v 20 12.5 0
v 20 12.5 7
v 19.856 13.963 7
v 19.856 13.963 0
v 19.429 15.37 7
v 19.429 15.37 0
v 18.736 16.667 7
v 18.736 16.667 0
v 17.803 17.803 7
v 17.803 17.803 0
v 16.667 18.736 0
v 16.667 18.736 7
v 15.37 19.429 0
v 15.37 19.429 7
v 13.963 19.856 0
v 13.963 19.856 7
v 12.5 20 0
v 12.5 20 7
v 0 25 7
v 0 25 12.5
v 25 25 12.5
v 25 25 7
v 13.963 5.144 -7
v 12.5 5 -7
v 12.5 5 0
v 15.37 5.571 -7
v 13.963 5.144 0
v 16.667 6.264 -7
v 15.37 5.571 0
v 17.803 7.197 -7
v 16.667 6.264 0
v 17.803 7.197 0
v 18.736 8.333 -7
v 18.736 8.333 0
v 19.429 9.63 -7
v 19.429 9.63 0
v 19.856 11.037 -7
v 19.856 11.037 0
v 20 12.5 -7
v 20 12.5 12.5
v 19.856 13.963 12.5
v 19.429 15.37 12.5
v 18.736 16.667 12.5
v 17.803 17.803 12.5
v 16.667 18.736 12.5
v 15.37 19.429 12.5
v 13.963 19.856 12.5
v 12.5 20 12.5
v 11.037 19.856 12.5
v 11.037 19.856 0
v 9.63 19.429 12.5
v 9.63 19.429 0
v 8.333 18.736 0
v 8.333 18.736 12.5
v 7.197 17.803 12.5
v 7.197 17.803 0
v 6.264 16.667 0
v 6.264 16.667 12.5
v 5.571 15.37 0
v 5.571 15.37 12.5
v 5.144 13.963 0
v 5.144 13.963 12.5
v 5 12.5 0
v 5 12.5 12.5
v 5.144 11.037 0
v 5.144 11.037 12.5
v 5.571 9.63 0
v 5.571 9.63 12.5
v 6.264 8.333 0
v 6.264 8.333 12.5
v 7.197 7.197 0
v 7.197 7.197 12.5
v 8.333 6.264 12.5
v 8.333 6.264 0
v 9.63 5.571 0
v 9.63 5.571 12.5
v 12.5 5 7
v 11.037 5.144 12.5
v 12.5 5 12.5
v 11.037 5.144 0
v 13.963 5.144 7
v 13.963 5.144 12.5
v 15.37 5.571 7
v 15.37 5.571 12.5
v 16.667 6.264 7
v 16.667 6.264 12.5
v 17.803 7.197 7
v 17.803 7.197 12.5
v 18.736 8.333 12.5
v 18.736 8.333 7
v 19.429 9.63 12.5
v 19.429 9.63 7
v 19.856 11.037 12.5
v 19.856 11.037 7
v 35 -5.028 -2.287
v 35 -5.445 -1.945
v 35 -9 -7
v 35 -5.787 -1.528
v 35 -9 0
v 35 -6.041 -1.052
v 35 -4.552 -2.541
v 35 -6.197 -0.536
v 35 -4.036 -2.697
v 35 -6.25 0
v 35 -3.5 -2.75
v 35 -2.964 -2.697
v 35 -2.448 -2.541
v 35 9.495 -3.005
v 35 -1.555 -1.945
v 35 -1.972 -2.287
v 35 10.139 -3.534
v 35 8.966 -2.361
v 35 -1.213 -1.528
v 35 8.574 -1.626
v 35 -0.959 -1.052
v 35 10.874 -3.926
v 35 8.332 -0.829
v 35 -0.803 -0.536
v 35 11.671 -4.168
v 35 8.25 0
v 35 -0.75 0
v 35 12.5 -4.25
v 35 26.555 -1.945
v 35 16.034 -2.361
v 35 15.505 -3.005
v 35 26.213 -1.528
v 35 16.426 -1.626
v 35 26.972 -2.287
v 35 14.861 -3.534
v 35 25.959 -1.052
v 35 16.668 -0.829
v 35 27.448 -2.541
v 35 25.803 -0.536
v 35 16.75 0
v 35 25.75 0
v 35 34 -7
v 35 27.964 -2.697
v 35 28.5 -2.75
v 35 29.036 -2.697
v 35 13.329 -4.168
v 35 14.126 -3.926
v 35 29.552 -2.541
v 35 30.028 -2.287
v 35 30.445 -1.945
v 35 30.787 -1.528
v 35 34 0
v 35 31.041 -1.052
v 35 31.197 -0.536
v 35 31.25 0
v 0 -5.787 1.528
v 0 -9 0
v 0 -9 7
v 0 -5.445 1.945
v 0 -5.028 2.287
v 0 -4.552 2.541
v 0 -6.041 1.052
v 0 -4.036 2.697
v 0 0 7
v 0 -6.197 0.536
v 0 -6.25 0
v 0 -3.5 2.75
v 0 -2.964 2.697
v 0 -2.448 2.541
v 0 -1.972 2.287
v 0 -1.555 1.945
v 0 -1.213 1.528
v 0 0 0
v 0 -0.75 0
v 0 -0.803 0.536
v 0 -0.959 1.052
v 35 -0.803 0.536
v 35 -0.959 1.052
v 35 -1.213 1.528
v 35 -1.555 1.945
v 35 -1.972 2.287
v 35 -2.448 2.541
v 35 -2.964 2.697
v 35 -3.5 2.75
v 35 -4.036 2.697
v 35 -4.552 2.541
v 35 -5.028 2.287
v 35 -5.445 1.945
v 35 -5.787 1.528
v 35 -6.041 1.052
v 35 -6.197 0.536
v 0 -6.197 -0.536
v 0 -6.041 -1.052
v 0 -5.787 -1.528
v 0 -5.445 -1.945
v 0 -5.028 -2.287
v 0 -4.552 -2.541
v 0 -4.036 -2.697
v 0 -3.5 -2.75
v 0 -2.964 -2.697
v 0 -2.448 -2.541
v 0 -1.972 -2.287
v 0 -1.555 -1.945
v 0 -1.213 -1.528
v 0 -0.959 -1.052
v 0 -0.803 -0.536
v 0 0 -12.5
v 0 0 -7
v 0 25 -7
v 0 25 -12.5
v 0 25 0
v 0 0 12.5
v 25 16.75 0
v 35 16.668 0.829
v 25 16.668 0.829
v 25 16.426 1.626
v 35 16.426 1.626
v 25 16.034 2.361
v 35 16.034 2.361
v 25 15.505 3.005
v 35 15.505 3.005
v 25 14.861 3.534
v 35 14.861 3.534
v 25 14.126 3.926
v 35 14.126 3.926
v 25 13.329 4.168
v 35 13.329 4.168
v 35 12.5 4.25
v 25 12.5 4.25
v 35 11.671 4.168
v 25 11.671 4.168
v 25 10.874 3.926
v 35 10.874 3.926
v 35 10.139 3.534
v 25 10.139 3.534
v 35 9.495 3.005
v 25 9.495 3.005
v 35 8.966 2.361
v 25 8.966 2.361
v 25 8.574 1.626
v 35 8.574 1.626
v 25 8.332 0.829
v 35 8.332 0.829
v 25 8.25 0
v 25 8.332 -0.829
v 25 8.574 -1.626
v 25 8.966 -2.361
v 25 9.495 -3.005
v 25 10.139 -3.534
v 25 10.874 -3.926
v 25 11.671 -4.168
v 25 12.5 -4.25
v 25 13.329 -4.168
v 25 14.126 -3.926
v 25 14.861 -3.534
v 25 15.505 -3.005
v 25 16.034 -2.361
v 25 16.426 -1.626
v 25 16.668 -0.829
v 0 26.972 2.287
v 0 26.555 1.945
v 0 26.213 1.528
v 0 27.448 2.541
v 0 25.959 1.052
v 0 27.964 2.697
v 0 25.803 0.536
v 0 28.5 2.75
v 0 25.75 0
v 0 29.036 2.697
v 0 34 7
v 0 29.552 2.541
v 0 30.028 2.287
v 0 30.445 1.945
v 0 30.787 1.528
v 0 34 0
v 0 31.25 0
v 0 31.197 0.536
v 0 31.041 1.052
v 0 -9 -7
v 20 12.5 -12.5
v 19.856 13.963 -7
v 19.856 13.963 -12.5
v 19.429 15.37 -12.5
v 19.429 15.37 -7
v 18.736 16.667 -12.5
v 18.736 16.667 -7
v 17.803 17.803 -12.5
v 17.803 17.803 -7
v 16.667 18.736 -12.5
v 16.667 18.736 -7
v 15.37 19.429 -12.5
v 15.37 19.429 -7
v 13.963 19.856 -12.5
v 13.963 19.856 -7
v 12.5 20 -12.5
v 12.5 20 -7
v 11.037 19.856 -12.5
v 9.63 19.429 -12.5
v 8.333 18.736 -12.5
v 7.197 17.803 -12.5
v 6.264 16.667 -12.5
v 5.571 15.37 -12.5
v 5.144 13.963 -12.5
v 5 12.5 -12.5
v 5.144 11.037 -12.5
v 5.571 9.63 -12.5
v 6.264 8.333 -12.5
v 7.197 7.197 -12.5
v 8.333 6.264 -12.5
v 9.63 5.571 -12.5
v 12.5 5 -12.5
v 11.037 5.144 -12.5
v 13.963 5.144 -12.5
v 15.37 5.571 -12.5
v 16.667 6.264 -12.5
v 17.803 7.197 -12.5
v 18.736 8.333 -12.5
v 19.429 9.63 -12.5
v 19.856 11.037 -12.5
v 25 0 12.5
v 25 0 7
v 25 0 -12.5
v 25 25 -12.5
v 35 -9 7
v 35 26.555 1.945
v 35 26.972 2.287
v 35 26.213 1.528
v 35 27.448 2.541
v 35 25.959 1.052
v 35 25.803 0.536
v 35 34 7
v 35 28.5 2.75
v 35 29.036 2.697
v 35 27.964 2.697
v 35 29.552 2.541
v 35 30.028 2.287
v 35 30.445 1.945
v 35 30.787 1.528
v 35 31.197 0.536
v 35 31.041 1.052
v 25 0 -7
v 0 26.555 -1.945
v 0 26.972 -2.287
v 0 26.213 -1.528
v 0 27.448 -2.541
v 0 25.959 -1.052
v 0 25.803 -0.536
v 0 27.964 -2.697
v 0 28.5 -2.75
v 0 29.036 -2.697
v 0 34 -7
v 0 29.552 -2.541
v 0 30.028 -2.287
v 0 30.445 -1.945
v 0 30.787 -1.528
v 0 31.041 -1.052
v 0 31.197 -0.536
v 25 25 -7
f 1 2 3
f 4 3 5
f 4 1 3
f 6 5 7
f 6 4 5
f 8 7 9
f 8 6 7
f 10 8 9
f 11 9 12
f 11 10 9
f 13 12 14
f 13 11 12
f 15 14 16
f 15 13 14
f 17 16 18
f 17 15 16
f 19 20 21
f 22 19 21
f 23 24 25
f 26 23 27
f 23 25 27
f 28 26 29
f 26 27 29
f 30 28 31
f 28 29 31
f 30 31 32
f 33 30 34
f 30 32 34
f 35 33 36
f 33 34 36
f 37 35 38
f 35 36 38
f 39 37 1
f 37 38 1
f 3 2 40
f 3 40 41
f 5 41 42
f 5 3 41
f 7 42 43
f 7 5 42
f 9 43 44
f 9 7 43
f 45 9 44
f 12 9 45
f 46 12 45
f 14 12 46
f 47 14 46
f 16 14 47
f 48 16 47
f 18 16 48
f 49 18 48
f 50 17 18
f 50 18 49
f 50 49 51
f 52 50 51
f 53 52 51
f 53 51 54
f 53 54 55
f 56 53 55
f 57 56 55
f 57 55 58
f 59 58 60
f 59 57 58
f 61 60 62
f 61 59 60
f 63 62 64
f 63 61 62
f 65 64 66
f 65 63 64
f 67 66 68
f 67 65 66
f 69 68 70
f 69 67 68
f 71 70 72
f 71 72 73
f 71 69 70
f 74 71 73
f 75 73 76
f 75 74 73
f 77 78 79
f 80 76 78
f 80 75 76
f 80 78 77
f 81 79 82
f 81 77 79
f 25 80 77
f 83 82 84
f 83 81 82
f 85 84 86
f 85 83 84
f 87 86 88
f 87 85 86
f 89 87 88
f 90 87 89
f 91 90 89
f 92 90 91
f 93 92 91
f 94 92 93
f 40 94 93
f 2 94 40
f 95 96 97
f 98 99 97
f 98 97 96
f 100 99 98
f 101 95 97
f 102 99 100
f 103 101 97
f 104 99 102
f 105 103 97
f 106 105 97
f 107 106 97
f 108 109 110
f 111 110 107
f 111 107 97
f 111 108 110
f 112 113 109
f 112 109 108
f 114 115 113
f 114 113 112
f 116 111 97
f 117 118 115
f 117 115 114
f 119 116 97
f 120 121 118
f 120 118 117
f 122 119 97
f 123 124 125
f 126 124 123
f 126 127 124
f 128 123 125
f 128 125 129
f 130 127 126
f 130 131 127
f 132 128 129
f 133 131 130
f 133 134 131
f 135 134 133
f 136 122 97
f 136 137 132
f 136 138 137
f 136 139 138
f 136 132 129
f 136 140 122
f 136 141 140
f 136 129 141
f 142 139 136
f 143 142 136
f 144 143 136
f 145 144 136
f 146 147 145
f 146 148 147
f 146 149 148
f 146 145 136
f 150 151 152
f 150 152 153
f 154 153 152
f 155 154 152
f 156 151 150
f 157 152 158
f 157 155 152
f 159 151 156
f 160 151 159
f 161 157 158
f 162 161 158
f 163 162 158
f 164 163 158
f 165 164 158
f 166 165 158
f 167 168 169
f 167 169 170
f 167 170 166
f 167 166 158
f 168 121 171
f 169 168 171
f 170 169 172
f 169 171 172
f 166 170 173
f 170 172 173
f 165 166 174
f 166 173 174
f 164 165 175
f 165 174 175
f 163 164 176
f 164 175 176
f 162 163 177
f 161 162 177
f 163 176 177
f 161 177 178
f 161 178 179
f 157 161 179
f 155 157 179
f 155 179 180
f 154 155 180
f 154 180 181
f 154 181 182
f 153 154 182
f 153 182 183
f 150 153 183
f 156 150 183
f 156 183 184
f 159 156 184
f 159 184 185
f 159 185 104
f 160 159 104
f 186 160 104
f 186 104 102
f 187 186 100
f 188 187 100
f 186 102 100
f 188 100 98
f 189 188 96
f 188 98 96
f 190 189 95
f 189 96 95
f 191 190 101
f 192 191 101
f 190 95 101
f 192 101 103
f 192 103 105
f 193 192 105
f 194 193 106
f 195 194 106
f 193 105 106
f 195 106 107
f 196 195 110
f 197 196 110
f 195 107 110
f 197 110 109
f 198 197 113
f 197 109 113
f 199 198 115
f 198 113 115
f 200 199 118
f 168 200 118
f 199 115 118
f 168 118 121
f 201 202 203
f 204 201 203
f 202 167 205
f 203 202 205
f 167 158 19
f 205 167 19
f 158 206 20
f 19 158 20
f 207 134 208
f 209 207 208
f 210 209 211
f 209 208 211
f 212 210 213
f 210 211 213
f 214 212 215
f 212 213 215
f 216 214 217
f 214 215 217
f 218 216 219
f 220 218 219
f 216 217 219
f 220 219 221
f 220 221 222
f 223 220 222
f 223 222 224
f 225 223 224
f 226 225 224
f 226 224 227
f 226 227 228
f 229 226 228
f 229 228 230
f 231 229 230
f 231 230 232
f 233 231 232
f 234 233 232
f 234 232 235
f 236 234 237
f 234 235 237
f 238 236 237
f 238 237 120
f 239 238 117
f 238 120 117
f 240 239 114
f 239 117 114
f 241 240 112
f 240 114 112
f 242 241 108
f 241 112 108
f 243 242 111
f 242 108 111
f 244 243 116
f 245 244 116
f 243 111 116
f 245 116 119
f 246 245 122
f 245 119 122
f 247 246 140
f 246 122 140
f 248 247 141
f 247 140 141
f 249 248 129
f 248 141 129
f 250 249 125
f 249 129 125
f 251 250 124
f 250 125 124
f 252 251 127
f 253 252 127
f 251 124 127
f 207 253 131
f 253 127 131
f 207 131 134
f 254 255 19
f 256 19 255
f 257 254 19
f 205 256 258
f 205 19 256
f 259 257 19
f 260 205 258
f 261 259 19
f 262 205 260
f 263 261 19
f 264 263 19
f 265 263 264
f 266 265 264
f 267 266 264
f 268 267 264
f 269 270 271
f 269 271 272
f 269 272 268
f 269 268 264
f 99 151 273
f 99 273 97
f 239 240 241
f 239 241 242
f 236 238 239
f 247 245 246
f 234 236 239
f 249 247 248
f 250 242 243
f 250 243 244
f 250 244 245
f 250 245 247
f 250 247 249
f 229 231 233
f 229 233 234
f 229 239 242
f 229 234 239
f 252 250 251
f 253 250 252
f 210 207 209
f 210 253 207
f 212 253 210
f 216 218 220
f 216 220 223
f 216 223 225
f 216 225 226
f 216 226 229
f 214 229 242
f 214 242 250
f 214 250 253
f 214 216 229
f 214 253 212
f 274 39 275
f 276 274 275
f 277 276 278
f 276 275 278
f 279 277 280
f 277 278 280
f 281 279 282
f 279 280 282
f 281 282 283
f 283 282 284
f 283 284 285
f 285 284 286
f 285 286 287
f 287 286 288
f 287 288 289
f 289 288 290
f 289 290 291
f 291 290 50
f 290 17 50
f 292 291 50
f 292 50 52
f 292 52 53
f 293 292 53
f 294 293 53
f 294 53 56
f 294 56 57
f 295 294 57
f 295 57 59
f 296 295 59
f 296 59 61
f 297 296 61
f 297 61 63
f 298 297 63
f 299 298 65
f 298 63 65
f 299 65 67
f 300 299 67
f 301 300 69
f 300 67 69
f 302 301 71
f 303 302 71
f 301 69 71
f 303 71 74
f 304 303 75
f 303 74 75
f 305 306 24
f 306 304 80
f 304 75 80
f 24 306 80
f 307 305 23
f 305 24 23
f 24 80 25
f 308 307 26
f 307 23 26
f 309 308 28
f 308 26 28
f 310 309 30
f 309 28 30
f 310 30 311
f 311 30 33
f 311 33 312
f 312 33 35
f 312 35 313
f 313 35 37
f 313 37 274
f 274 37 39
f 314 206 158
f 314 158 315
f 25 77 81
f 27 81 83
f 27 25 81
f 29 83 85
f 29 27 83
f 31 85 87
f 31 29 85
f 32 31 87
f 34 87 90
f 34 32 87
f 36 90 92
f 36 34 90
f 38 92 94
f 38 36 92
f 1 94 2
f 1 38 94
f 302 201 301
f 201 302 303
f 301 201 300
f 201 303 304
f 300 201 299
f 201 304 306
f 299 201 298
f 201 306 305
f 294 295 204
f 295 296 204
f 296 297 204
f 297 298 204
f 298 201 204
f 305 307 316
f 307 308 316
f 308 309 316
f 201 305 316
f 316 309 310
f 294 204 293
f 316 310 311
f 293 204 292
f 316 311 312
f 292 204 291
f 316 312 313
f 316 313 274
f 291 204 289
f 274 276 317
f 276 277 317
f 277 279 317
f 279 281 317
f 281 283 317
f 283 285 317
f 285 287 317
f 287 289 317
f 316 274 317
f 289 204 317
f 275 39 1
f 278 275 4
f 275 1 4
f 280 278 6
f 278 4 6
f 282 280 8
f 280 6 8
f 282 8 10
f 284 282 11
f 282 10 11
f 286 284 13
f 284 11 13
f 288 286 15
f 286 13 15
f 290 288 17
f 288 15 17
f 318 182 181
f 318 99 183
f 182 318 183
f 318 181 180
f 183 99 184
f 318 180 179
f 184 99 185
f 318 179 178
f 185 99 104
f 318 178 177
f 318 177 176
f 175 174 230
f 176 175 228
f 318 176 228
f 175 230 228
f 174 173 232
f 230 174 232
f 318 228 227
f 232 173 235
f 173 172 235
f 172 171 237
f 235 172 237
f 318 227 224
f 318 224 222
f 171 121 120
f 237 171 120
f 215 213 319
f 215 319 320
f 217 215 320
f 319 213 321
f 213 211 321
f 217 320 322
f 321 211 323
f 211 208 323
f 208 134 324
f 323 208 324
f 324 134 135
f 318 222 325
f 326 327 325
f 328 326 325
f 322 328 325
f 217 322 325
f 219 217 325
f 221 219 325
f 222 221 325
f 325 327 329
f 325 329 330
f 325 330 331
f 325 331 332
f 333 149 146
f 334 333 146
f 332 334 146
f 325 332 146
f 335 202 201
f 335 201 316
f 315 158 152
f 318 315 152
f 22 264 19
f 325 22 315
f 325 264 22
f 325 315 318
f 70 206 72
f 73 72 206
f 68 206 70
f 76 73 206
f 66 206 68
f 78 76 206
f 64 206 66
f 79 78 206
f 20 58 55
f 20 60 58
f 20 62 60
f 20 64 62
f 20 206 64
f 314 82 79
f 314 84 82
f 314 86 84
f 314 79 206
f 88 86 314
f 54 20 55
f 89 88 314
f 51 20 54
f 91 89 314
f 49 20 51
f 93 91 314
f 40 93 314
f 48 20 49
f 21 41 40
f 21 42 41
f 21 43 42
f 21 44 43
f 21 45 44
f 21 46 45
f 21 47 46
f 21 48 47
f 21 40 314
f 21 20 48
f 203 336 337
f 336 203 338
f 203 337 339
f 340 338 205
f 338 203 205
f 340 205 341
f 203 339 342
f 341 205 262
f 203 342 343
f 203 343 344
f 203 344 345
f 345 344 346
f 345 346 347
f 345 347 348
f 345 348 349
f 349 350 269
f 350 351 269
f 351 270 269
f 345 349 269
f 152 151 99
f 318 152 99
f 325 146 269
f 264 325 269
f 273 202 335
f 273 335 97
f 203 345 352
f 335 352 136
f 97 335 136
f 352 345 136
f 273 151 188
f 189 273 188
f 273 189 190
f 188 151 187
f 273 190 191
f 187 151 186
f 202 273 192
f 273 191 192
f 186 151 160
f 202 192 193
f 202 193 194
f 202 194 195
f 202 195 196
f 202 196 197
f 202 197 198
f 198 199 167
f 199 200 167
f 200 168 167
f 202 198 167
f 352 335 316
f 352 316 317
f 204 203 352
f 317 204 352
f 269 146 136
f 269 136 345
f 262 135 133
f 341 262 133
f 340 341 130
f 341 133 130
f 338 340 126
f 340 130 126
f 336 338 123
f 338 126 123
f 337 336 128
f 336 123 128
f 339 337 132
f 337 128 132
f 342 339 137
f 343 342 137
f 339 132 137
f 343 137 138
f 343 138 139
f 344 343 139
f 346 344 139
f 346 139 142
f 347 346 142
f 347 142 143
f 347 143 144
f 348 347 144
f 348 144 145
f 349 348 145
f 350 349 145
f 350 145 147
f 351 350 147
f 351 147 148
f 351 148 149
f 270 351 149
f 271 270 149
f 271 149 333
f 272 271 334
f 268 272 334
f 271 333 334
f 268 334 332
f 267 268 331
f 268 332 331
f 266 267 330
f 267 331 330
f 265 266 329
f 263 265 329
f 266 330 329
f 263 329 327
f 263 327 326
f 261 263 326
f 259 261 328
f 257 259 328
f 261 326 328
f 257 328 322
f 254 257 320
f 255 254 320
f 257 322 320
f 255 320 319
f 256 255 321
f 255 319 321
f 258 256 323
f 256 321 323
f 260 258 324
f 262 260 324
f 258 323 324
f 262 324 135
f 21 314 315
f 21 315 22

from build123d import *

# Parameters (mm, degrees)
F0_W          = 25
F0_H          = 25
F0_R          = 7.5
F1_DEPTH      = 12.5
F1_DEPTH_BACK = 12.5
F2_W          = 12.5
F2_H          = 9
F3_DEPTH      = 7
F3_DEPTH_BACK = 7
F6_DEPTH      = 10
F5_R          = 2.75
F7_DEPTH      = 35.1


with BuildPart() as f1:
    # F0 (on Top) → F1 (new body, two sides)
    with BuildSketch(Plane.XY) as f1_sk:
        with Locations((12.5, 12.5)):
            Rectangle(F0_W, F0_H)
        with Locations((12.5, 12.5)):
            Circle(F0_R, mode=Mode.SUBTRACT)
    extrude(amount=F1_DEPTH)
    extrude(f1_sk.sketch, amount=-F1_DEPTH_BACK)

    # F2 (on Top) → F3 (join, two sides)
    with BuildSketch(Plane.XY) as f3_sk:
        with BuildLine():
            Line((12.5, 34), (12.5, 25))
            Line((12.5, 25), (12.5, 20))
            ThreePointArc((12.5, 20), (17.803301, 17.803301), (20, 12.5))
            ThreePointArc((20, 12.5), (17.803301, 7.196699), (12.5, 5))
            Line((12.5, 5), (12.5, 0))
            Line((12.5, 0), (12.5, -9))
            Line((12.5, -9), (35, -9))
            Line((35, -9), (35, 34))
            Line((35, 34), (12.5, 34))
        make_face()
        with Locations((6.25, 29.5)):
            Rectangle(F2_W, F2_H)
        with Locations((6.25, -4.5)):
            Rectangle(F2_W, F2_H)
    extrude(amount=F3_DEPTH)
    extrude(f3_sk.sketch, amount=-F3_DEPTH_BACK)

    # F4 (on face) → F6 (cut)
    with BuildSketch(Plane.YZ.offset(35)):
        with BuildLine():
            ThreePointArc((8.25, 0), (12.5, -4.25), (16.75, 0))
            ThreePointArc((16.75, 0), (12.5, 4.25), (8.25, 0))
        make_face()
    extrude(amount=-F6_DEPTH, mode=Mode.SUBTRACT)

    # F5 (on face) → F7 (cut)
    with BuildSketch(Plane.YZ.offset(35)):
        with BuildLine():
            ThreePointArc((31.25, 0), (28.5, 2.75), (25.75, 0))
            ThreePointArc((25.75, 0), (28.5, -2.75), (31.25, 0))
        make_face()
        with Locations((-3.5, 0)):
            Circle(F5_R)
    extrude(amount=-F7_DEPTH, mode=Mode.SUBTRACT)


solid = f1.part
